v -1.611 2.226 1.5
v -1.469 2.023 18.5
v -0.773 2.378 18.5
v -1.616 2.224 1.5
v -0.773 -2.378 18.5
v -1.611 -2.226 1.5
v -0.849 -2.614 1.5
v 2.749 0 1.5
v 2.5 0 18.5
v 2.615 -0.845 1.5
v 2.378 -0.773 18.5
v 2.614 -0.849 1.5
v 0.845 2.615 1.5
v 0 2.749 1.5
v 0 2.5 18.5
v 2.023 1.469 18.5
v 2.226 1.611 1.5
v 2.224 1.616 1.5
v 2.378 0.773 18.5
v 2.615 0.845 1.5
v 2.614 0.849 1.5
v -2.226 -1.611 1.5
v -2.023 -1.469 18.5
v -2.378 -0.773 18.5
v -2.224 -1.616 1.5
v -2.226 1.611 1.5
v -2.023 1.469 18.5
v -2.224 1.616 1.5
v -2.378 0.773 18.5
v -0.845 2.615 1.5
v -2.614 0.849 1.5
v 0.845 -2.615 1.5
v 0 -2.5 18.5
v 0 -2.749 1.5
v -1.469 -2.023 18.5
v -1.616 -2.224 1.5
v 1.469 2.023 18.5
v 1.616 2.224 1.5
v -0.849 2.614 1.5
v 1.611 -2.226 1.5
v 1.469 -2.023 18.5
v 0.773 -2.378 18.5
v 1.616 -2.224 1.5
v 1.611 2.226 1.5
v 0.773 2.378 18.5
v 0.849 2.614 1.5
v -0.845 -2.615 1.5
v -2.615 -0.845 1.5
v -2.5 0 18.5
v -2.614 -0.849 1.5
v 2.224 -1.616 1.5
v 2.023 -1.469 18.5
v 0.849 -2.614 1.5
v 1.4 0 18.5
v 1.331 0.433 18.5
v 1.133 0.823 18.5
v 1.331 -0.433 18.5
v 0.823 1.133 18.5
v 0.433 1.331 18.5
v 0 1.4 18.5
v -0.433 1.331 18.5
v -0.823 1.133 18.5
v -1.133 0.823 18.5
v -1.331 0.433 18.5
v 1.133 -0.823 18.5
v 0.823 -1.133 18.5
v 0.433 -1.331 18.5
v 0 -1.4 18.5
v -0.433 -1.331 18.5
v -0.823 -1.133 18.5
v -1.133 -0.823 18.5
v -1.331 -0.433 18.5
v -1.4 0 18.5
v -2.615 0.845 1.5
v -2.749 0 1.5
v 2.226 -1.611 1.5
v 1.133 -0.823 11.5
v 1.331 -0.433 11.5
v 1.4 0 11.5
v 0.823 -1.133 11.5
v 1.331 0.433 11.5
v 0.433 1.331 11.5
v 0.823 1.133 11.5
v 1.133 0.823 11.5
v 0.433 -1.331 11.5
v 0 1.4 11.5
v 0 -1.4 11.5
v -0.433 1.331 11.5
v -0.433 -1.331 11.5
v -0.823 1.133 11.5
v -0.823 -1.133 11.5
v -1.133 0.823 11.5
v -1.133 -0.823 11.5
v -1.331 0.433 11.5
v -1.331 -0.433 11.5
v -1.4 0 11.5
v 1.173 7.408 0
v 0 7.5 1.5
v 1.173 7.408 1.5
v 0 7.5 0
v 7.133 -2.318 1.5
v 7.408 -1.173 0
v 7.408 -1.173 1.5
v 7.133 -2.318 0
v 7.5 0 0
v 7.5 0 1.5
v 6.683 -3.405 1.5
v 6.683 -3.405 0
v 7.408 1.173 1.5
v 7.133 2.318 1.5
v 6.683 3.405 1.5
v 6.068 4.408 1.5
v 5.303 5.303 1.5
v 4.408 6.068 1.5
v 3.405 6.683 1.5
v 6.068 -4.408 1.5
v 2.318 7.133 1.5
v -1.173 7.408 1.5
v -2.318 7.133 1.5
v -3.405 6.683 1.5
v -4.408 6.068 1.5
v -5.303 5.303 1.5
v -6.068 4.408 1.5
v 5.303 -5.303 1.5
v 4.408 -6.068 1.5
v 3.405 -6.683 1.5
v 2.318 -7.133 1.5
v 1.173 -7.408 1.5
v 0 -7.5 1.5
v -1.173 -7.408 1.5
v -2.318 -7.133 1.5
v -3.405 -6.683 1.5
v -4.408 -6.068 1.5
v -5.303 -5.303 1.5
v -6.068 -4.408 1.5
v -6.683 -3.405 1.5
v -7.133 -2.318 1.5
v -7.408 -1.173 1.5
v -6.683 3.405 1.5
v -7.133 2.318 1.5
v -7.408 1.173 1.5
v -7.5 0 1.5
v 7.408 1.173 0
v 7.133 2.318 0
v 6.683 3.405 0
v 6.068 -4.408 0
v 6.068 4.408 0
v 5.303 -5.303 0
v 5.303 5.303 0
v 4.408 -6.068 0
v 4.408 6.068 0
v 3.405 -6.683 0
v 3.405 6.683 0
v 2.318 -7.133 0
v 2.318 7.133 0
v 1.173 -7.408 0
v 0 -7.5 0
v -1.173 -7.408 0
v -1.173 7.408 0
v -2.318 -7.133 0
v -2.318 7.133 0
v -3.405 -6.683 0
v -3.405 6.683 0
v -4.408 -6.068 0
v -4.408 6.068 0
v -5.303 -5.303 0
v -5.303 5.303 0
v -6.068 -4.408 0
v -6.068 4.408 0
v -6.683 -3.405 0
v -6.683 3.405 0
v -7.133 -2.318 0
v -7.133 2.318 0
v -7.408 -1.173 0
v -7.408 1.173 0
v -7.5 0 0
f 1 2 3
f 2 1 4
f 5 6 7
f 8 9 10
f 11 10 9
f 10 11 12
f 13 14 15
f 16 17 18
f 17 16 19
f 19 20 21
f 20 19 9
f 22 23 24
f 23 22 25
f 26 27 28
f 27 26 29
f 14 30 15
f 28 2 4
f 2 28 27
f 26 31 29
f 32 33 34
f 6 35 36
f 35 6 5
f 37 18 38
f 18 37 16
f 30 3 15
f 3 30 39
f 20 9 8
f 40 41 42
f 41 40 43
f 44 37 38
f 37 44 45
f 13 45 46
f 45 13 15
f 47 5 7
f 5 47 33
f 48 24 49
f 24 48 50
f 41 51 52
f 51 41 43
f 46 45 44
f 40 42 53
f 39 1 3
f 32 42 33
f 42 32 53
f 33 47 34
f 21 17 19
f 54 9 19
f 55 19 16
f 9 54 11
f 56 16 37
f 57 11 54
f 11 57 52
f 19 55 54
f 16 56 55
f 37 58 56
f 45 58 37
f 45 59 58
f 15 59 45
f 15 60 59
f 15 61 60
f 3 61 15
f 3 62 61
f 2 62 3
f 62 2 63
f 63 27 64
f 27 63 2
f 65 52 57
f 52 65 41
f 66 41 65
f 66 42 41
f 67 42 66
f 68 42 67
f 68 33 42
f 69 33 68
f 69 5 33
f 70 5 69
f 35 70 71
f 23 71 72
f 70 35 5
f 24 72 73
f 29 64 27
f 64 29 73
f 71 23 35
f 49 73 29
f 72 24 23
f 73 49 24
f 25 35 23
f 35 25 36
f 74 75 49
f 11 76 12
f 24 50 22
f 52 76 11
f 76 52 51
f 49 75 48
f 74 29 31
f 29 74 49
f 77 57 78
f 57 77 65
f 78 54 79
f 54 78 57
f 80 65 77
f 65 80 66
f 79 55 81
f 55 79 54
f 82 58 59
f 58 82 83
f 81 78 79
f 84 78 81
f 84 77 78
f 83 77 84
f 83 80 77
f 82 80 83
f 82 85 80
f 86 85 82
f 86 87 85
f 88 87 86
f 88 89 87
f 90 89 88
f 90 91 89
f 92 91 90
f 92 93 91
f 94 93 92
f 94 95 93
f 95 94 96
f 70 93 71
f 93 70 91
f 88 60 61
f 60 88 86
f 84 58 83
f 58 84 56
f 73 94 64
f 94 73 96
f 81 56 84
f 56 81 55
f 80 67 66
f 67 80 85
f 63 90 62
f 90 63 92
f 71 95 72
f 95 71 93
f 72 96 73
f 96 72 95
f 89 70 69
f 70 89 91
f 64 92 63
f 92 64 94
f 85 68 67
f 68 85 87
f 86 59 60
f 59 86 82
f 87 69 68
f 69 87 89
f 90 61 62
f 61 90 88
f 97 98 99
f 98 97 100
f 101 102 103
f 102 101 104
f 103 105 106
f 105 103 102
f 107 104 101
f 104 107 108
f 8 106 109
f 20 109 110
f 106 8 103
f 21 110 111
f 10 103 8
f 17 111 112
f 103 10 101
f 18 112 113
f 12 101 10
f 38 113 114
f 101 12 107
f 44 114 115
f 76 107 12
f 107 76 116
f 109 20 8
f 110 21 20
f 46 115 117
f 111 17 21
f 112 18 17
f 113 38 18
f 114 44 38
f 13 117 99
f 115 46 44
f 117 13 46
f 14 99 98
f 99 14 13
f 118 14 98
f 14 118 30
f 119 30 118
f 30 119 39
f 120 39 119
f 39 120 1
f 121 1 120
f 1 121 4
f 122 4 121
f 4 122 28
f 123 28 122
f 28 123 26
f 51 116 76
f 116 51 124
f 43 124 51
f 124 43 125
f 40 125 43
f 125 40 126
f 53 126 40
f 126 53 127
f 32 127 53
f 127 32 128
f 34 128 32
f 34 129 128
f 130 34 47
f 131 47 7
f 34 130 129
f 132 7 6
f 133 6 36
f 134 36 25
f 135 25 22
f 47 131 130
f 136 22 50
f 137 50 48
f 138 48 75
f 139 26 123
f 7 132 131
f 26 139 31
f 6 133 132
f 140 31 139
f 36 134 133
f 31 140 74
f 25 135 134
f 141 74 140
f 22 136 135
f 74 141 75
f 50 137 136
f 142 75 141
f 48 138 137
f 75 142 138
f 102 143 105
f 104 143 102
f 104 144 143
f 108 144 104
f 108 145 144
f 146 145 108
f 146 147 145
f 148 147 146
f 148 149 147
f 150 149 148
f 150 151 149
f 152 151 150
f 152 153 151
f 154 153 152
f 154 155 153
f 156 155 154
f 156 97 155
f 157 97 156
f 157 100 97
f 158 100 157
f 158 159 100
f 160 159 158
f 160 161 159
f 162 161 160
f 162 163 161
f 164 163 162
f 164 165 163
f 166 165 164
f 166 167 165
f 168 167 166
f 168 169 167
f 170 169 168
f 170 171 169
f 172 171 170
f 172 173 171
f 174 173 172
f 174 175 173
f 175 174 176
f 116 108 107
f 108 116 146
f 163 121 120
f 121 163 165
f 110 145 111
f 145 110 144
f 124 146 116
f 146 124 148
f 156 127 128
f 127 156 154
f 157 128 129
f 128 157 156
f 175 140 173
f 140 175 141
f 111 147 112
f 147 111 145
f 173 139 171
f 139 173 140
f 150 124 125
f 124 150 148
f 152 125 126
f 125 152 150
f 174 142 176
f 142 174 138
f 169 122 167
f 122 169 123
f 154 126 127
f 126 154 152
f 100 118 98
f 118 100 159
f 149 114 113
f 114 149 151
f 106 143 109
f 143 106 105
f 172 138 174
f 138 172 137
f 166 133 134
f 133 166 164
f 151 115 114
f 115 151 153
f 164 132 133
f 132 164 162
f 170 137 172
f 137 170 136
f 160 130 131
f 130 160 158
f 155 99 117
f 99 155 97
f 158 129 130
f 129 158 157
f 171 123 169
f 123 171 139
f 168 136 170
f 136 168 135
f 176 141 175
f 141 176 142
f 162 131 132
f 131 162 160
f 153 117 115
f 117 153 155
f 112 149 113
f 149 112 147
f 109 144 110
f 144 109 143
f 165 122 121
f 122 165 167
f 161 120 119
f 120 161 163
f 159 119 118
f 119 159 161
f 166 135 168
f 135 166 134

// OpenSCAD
axle_inner_diam = 2.8;
axle_outer_diam = 5;
axle_outer_top_diam = 5.5;
axle_length = 17;

top_diam = 15;
top_thickness = 1.5;
top_washer_diam = 12;
top_washer_thickness = 0.5;

module corn_holder() {
	render() difference() {
		cylinder(d1=axle_outer_diam, d2=axle_outer_top_diam, h=axle_length+0.1, $fn=20);
		cylinder(d=axle_inner_diam, h=7, $fn=20); 
	}
	translate([0 , 0, axle_length]) { 
		render() difference() {
			cylinder(d=top_diam, h=top_thickness,$fn=40);
			//translate([0,0,top_thickness-top_washer_thickness]) cylinder(d=top_washer_diam, h=top_washer_thickness,$fn=40);
		}
	}
}

rotate([180,0,0]) translate([0,0,-axle_length-top_thickness]) corn_holder();
